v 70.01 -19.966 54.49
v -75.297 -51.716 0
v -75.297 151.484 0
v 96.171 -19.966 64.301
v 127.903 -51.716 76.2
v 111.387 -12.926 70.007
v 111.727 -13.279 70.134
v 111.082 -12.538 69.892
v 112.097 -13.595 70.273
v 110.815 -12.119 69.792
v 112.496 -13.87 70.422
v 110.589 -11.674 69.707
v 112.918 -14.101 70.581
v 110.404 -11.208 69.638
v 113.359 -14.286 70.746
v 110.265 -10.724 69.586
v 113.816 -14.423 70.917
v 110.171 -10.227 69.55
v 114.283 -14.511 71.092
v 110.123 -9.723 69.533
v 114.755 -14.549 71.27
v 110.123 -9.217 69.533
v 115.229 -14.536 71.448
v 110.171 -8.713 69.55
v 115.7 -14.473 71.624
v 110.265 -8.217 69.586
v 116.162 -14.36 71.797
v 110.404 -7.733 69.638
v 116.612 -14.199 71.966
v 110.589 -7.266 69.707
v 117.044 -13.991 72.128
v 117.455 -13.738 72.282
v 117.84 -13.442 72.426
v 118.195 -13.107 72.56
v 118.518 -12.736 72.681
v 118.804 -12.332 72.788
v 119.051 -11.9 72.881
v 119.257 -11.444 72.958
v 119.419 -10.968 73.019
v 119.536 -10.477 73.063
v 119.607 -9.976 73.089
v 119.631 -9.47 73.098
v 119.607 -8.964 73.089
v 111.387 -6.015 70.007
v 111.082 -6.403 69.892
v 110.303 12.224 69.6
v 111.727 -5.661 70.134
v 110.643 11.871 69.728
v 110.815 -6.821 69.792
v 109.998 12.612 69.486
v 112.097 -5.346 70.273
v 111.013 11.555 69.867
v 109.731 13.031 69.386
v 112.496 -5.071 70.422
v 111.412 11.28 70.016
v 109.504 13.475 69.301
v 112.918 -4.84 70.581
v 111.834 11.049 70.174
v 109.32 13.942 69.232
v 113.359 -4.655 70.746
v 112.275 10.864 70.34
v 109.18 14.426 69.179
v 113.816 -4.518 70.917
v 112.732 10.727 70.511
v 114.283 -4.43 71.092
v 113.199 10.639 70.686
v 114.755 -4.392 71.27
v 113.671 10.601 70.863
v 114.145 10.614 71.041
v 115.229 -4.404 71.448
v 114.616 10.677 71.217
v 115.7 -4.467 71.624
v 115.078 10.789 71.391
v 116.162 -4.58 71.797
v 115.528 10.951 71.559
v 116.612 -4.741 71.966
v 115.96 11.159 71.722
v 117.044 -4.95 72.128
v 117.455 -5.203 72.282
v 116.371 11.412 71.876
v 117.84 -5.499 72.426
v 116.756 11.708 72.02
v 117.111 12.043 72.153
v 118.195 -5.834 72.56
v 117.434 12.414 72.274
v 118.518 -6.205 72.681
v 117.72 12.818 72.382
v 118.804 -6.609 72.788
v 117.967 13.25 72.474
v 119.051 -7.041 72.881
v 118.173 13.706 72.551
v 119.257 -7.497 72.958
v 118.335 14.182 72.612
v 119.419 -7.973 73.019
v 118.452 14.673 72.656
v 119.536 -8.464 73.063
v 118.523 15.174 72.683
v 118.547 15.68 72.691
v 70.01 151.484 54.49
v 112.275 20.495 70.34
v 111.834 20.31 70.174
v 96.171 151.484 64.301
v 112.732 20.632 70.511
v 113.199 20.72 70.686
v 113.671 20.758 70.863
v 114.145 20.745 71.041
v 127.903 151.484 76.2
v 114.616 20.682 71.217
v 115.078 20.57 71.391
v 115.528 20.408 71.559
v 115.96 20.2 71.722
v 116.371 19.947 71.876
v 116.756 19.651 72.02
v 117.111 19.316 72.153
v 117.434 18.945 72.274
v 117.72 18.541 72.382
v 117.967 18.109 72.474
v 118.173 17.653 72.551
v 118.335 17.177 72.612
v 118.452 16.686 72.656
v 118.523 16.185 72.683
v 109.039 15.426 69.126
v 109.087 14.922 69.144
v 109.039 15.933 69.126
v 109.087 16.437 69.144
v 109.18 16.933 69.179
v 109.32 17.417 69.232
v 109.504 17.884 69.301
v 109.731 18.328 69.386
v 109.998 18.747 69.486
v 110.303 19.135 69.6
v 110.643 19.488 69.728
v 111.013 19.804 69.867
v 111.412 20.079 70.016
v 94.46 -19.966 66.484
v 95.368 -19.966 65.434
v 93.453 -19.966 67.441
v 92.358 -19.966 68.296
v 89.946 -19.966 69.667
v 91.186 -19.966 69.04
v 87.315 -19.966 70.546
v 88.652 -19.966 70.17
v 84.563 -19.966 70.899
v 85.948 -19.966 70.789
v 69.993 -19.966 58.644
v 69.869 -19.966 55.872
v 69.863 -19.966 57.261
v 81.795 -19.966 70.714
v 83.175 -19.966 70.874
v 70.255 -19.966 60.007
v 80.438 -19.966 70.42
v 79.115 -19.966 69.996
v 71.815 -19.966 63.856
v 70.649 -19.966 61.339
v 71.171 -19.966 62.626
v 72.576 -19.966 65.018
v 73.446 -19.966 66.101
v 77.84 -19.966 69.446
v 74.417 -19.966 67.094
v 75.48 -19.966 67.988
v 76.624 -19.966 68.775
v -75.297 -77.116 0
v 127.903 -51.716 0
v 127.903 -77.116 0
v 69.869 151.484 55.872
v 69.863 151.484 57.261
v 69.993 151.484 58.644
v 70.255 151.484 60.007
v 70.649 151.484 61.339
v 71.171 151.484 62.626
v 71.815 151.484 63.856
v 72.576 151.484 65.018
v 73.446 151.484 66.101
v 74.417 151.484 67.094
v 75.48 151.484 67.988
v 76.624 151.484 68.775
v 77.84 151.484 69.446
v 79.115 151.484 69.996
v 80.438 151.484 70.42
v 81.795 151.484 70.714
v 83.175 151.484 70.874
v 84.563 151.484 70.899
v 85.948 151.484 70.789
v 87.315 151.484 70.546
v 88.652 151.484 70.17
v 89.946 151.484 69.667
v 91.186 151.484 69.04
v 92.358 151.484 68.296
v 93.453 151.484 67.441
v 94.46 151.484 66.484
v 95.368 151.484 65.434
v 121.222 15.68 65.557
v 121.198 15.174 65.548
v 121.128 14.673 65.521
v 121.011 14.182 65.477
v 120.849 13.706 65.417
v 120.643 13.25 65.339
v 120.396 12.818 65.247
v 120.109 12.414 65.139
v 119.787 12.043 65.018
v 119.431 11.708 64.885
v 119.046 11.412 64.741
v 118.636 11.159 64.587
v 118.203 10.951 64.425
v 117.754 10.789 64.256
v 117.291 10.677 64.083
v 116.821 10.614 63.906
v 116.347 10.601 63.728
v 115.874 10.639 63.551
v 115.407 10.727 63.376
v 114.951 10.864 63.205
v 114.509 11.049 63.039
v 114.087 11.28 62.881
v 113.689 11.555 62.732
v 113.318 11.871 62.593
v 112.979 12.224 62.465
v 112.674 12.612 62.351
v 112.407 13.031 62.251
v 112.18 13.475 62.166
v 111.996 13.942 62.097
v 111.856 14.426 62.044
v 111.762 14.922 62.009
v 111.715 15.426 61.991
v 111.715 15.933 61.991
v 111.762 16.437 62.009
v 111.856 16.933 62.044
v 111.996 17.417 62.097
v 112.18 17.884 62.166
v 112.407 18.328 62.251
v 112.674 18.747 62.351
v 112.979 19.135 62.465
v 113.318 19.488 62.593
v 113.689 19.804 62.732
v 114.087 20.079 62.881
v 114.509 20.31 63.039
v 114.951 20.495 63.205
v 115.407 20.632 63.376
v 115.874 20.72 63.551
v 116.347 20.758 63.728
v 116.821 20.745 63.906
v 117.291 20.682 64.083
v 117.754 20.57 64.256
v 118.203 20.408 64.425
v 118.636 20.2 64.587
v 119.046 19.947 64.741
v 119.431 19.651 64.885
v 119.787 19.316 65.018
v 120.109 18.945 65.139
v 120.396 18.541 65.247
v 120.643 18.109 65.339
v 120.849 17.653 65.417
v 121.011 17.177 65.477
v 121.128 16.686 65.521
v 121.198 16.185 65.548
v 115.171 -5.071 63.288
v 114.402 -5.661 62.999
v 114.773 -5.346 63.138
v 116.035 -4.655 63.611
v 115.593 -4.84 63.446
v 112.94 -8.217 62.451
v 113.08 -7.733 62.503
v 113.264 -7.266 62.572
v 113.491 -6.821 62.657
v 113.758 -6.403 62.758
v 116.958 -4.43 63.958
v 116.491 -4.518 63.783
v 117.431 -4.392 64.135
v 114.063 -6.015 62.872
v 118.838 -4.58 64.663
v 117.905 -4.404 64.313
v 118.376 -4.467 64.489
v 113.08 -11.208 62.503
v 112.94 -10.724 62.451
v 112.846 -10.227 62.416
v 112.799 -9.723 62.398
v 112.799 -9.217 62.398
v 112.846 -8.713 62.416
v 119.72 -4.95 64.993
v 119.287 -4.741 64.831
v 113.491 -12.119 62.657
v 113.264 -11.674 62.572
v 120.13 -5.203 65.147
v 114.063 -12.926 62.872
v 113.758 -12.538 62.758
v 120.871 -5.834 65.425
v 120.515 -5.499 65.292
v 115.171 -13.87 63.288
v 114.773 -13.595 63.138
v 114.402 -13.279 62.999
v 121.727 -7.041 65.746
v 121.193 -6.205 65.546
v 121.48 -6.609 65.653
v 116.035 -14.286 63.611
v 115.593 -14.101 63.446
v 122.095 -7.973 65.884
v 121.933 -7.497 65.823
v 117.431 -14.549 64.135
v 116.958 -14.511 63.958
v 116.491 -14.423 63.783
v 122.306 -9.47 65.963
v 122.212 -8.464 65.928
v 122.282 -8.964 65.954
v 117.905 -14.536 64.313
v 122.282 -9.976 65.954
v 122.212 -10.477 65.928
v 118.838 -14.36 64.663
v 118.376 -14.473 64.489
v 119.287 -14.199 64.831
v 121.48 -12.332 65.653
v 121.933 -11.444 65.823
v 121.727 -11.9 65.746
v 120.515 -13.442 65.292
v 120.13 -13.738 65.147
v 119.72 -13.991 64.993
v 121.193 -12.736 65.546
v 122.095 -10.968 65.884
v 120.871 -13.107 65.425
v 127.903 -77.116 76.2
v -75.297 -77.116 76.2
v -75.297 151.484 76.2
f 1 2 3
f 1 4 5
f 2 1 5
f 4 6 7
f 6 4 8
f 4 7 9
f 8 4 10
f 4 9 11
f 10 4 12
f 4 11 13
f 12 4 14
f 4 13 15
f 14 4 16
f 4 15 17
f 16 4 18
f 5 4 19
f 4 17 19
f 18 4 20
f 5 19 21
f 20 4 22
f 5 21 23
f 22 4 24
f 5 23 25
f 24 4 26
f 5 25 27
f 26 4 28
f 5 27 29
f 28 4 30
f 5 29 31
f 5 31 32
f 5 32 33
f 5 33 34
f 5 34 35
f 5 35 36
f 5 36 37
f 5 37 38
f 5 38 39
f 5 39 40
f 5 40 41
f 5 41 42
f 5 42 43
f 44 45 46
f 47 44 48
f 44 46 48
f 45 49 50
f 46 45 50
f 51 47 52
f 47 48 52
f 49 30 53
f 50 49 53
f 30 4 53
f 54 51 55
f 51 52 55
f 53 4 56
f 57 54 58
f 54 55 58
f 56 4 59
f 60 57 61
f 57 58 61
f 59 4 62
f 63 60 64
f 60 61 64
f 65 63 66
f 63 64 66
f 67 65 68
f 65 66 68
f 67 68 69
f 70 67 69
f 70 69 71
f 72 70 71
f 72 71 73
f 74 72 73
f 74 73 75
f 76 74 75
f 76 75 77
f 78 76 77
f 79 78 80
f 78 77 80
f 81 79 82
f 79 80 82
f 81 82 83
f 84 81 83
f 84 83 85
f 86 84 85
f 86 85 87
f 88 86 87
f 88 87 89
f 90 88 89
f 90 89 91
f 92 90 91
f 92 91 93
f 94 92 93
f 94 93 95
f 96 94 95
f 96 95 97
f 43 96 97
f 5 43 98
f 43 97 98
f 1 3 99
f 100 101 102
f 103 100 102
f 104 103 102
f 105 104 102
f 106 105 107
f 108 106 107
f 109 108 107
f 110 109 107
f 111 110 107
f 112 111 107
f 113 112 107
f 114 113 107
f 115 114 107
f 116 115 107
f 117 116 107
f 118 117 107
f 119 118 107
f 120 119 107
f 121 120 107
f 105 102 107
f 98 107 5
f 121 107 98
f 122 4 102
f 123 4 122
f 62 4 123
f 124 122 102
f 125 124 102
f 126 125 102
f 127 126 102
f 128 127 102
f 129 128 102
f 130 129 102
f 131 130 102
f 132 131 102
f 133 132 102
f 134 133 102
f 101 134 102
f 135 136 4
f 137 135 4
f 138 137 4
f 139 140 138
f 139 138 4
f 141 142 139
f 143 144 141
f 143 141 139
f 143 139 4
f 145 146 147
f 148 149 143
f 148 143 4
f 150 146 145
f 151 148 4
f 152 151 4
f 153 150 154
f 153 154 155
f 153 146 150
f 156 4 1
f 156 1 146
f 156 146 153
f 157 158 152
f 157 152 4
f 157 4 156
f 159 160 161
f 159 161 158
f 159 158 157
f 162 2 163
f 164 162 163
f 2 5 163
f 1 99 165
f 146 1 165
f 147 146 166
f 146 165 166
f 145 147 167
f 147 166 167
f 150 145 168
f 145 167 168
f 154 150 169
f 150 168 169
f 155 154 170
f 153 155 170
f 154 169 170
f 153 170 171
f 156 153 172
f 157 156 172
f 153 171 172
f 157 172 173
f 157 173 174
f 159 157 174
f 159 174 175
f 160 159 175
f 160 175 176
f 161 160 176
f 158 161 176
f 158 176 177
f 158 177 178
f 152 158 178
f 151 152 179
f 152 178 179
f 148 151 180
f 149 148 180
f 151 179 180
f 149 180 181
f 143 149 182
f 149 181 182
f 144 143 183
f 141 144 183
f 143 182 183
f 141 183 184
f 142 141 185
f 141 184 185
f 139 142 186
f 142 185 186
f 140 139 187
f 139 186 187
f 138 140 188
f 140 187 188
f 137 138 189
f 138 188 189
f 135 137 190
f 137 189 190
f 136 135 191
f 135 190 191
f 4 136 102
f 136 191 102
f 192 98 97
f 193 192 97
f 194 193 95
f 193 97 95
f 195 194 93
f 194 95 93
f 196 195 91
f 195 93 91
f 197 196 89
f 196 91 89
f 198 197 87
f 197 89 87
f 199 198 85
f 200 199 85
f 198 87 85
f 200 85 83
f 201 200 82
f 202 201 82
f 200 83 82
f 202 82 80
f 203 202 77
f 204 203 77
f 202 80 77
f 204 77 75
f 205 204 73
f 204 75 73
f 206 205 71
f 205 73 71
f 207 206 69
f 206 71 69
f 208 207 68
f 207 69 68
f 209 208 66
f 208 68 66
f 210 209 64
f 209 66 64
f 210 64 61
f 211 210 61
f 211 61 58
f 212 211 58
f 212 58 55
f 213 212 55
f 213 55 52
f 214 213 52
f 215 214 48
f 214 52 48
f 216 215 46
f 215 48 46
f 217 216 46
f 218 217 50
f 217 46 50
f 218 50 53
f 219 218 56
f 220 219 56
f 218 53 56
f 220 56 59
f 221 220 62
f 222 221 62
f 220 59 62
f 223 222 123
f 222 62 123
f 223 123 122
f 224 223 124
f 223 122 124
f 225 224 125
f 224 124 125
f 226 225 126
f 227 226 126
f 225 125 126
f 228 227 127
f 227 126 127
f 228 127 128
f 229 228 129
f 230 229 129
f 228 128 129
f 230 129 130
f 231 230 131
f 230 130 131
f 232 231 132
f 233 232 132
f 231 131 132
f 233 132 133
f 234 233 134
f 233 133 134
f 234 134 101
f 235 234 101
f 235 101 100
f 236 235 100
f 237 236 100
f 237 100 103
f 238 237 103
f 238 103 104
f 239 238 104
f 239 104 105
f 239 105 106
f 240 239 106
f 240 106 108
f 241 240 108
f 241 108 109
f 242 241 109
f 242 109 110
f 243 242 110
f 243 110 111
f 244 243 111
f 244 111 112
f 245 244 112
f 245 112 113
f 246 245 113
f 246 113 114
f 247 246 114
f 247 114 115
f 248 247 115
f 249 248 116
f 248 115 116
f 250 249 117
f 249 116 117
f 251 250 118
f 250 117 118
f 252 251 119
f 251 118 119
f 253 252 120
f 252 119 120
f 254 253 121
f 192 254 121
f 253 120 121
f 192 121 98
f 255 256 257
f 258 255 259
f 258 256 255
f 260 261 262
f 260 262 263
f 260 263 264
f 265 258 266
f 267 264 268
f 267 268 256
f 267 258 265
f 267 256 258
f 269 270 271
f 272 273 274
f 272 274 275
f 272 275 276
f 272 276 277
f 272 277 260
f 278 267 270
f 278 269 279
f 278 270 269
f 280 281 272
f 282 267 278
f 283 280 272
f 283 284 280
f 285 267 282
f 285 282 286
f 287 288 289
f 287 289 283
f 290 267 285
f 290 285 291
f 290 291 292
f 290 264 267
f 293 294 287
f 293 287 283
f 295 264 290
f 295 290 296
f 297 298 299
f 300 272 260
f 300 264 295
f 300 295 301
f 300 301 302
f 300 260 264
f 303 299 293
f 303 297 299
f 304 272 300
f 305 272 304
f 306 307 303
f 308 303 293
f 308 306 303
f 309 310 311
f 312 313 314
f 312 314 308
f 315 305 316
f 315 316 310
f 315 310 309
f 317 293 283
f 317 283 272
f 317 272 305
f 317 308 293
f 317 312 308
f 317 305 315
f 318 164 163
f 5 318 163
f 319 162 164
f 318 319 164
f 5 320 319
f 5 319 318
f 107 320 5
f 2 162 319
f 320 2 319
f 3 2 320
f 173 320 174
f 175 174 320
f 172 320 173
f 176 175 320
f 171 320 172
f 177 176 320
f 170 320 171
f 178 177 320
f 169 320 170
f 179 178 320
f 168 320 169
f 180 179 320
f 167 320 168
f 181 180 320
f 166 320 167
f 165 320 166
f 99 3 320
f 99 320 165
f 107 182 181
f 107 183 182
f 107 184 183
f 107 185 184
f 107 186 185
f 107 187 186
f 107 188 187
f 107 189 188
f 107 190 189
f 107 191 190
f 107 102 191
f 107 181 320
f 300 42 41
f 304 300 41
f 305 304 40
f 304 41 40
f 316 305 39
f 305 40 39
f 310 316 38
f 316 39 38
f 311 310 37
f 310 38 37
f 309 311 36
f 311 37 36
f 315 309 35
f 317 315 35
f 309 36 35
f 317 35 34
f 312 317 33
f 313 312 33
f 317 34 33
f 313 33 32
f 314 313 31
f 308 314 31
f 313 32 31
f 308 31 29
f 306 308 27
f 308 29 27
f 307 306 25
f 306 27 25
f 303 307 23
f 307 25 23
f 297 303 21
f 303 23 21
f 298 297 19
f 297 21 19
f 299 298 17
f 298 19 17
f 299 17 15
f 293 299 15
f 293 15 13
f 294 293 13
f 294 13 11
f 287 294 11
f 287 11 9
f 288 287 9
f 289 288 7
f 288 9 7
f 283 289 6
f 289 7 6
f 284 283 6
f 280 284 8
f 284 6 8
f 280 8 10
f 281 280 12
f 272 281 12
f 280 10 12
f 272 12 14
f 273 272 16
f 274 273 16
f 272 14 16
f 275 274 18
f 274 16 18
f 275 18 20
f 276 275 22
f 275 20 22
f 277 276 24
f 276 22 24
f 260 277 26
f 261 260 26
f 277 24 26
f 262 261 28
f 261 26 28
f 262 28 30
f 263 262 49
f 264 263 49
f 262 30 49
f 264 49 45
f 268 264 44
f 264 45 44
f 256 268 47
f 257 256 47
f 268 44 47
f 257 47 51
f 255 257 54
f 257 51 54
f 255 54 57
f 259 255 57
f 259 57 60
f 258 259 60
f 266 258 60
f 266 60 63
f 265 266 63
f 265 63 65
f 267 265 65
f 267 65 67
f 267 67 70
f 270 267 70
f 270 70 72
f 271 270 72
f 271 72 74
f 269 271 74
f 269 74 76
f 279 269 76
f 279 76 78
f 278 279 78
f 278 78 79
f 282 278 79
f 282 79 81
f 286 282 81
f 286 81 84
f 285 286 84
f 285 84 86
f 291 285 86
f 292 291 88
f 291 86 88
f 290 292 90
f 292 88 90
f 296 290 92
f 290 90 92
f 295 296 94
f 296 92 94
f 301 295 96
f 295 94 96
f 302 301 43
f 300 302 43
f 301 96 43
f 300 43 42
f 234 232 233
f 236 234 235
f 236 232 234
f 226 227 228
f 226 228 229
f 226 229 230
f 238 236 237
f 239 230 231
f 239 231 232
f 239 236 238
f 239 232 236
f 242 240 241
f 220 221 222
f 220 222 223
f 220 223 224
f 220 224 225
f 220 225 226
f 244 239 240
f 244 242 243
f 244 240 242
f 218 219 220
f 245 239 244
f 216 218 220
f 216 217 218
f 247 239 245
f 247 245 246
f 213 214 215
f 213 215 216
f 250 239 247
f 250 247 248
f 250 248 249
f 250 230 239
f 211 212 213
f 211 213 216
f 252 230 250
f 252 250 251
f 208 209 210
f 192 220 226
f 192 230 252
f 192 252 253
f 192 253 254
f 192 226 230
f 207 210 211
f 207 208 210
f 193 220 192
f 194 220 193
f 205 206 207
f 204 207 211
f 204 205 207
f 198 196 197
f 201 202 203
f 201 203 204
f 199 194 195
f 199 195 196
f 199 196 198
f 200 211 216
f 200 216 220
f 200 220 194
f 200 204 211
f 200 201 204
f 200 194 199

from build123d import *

# Parameters (mm, degrees)
F0_W     = 203.2
F0_H     = 228.6
F1_DEPTH = 76.2
F3_DEPTH = 203.2
F5_DEPTH = 171.45
F6_R     = 5.08
F7_DEPTH = 7.62


with BuildPart() as f1:
    # F0 (on Top) → F1 (new body)
    with BuildSketch(Plane.XY):
        with Locations((26.3025880603, 37.1842714906)):
            Rectangle(F0_W, F0_H)
    extrude(amount=F1_DEPTH)

    # F2 (on face) → F3 (cut)
    with BuildSketch(Plane(origin=(0, 151.4842714906, 0), x_dir=(-1, 0, 0), z_dir=(0, 1, 0))):
        Polygon((-127.9025880603, 0), (75.2974119397, 0), (-127.9025880603, 76.2), align=None)
    extrude(amount=-F3_DEPTH, mode=Mode.SUBTRACT)

    # F4 (on face) → F5 (cut)
    with BuildSketch(Plane(origin=(0, 151.4842714906, 0), x_dir=(-1, 0, 0), z_dir=(0, 1, 0))):
        with BuildLine():
            Line((-96.1709320552, 64.3006289981), (-70.0098948339, 54.4902400401))
            ThreePointArc((-70.0098948339, 54.4902400401), (-79.1150585712, 69.996380848), (-96.1709320552, 64.3006289981))
        make_face()
    extrude(amount=-F5_DEPTH, mode=Mode.SUBTRACT)

    # F6 (on face) → F7 (join)
    with BuildSketch(Plane(origin=(-9.2832425679, 0, 24.7553135144), x_dir=(0.9363291776, 0, 0.3511234416), z_dir=(0.3511234416, 0, -0.9363291776))):
        with Locations((131.4422286823, -15.679504171)):
            Circle(F6_R)
        with Locations((132.6000029427, 9.4702642467)):
            Circle(F6_R)
    extrude(amount=F7_DEPTH)


solid = f1.part
